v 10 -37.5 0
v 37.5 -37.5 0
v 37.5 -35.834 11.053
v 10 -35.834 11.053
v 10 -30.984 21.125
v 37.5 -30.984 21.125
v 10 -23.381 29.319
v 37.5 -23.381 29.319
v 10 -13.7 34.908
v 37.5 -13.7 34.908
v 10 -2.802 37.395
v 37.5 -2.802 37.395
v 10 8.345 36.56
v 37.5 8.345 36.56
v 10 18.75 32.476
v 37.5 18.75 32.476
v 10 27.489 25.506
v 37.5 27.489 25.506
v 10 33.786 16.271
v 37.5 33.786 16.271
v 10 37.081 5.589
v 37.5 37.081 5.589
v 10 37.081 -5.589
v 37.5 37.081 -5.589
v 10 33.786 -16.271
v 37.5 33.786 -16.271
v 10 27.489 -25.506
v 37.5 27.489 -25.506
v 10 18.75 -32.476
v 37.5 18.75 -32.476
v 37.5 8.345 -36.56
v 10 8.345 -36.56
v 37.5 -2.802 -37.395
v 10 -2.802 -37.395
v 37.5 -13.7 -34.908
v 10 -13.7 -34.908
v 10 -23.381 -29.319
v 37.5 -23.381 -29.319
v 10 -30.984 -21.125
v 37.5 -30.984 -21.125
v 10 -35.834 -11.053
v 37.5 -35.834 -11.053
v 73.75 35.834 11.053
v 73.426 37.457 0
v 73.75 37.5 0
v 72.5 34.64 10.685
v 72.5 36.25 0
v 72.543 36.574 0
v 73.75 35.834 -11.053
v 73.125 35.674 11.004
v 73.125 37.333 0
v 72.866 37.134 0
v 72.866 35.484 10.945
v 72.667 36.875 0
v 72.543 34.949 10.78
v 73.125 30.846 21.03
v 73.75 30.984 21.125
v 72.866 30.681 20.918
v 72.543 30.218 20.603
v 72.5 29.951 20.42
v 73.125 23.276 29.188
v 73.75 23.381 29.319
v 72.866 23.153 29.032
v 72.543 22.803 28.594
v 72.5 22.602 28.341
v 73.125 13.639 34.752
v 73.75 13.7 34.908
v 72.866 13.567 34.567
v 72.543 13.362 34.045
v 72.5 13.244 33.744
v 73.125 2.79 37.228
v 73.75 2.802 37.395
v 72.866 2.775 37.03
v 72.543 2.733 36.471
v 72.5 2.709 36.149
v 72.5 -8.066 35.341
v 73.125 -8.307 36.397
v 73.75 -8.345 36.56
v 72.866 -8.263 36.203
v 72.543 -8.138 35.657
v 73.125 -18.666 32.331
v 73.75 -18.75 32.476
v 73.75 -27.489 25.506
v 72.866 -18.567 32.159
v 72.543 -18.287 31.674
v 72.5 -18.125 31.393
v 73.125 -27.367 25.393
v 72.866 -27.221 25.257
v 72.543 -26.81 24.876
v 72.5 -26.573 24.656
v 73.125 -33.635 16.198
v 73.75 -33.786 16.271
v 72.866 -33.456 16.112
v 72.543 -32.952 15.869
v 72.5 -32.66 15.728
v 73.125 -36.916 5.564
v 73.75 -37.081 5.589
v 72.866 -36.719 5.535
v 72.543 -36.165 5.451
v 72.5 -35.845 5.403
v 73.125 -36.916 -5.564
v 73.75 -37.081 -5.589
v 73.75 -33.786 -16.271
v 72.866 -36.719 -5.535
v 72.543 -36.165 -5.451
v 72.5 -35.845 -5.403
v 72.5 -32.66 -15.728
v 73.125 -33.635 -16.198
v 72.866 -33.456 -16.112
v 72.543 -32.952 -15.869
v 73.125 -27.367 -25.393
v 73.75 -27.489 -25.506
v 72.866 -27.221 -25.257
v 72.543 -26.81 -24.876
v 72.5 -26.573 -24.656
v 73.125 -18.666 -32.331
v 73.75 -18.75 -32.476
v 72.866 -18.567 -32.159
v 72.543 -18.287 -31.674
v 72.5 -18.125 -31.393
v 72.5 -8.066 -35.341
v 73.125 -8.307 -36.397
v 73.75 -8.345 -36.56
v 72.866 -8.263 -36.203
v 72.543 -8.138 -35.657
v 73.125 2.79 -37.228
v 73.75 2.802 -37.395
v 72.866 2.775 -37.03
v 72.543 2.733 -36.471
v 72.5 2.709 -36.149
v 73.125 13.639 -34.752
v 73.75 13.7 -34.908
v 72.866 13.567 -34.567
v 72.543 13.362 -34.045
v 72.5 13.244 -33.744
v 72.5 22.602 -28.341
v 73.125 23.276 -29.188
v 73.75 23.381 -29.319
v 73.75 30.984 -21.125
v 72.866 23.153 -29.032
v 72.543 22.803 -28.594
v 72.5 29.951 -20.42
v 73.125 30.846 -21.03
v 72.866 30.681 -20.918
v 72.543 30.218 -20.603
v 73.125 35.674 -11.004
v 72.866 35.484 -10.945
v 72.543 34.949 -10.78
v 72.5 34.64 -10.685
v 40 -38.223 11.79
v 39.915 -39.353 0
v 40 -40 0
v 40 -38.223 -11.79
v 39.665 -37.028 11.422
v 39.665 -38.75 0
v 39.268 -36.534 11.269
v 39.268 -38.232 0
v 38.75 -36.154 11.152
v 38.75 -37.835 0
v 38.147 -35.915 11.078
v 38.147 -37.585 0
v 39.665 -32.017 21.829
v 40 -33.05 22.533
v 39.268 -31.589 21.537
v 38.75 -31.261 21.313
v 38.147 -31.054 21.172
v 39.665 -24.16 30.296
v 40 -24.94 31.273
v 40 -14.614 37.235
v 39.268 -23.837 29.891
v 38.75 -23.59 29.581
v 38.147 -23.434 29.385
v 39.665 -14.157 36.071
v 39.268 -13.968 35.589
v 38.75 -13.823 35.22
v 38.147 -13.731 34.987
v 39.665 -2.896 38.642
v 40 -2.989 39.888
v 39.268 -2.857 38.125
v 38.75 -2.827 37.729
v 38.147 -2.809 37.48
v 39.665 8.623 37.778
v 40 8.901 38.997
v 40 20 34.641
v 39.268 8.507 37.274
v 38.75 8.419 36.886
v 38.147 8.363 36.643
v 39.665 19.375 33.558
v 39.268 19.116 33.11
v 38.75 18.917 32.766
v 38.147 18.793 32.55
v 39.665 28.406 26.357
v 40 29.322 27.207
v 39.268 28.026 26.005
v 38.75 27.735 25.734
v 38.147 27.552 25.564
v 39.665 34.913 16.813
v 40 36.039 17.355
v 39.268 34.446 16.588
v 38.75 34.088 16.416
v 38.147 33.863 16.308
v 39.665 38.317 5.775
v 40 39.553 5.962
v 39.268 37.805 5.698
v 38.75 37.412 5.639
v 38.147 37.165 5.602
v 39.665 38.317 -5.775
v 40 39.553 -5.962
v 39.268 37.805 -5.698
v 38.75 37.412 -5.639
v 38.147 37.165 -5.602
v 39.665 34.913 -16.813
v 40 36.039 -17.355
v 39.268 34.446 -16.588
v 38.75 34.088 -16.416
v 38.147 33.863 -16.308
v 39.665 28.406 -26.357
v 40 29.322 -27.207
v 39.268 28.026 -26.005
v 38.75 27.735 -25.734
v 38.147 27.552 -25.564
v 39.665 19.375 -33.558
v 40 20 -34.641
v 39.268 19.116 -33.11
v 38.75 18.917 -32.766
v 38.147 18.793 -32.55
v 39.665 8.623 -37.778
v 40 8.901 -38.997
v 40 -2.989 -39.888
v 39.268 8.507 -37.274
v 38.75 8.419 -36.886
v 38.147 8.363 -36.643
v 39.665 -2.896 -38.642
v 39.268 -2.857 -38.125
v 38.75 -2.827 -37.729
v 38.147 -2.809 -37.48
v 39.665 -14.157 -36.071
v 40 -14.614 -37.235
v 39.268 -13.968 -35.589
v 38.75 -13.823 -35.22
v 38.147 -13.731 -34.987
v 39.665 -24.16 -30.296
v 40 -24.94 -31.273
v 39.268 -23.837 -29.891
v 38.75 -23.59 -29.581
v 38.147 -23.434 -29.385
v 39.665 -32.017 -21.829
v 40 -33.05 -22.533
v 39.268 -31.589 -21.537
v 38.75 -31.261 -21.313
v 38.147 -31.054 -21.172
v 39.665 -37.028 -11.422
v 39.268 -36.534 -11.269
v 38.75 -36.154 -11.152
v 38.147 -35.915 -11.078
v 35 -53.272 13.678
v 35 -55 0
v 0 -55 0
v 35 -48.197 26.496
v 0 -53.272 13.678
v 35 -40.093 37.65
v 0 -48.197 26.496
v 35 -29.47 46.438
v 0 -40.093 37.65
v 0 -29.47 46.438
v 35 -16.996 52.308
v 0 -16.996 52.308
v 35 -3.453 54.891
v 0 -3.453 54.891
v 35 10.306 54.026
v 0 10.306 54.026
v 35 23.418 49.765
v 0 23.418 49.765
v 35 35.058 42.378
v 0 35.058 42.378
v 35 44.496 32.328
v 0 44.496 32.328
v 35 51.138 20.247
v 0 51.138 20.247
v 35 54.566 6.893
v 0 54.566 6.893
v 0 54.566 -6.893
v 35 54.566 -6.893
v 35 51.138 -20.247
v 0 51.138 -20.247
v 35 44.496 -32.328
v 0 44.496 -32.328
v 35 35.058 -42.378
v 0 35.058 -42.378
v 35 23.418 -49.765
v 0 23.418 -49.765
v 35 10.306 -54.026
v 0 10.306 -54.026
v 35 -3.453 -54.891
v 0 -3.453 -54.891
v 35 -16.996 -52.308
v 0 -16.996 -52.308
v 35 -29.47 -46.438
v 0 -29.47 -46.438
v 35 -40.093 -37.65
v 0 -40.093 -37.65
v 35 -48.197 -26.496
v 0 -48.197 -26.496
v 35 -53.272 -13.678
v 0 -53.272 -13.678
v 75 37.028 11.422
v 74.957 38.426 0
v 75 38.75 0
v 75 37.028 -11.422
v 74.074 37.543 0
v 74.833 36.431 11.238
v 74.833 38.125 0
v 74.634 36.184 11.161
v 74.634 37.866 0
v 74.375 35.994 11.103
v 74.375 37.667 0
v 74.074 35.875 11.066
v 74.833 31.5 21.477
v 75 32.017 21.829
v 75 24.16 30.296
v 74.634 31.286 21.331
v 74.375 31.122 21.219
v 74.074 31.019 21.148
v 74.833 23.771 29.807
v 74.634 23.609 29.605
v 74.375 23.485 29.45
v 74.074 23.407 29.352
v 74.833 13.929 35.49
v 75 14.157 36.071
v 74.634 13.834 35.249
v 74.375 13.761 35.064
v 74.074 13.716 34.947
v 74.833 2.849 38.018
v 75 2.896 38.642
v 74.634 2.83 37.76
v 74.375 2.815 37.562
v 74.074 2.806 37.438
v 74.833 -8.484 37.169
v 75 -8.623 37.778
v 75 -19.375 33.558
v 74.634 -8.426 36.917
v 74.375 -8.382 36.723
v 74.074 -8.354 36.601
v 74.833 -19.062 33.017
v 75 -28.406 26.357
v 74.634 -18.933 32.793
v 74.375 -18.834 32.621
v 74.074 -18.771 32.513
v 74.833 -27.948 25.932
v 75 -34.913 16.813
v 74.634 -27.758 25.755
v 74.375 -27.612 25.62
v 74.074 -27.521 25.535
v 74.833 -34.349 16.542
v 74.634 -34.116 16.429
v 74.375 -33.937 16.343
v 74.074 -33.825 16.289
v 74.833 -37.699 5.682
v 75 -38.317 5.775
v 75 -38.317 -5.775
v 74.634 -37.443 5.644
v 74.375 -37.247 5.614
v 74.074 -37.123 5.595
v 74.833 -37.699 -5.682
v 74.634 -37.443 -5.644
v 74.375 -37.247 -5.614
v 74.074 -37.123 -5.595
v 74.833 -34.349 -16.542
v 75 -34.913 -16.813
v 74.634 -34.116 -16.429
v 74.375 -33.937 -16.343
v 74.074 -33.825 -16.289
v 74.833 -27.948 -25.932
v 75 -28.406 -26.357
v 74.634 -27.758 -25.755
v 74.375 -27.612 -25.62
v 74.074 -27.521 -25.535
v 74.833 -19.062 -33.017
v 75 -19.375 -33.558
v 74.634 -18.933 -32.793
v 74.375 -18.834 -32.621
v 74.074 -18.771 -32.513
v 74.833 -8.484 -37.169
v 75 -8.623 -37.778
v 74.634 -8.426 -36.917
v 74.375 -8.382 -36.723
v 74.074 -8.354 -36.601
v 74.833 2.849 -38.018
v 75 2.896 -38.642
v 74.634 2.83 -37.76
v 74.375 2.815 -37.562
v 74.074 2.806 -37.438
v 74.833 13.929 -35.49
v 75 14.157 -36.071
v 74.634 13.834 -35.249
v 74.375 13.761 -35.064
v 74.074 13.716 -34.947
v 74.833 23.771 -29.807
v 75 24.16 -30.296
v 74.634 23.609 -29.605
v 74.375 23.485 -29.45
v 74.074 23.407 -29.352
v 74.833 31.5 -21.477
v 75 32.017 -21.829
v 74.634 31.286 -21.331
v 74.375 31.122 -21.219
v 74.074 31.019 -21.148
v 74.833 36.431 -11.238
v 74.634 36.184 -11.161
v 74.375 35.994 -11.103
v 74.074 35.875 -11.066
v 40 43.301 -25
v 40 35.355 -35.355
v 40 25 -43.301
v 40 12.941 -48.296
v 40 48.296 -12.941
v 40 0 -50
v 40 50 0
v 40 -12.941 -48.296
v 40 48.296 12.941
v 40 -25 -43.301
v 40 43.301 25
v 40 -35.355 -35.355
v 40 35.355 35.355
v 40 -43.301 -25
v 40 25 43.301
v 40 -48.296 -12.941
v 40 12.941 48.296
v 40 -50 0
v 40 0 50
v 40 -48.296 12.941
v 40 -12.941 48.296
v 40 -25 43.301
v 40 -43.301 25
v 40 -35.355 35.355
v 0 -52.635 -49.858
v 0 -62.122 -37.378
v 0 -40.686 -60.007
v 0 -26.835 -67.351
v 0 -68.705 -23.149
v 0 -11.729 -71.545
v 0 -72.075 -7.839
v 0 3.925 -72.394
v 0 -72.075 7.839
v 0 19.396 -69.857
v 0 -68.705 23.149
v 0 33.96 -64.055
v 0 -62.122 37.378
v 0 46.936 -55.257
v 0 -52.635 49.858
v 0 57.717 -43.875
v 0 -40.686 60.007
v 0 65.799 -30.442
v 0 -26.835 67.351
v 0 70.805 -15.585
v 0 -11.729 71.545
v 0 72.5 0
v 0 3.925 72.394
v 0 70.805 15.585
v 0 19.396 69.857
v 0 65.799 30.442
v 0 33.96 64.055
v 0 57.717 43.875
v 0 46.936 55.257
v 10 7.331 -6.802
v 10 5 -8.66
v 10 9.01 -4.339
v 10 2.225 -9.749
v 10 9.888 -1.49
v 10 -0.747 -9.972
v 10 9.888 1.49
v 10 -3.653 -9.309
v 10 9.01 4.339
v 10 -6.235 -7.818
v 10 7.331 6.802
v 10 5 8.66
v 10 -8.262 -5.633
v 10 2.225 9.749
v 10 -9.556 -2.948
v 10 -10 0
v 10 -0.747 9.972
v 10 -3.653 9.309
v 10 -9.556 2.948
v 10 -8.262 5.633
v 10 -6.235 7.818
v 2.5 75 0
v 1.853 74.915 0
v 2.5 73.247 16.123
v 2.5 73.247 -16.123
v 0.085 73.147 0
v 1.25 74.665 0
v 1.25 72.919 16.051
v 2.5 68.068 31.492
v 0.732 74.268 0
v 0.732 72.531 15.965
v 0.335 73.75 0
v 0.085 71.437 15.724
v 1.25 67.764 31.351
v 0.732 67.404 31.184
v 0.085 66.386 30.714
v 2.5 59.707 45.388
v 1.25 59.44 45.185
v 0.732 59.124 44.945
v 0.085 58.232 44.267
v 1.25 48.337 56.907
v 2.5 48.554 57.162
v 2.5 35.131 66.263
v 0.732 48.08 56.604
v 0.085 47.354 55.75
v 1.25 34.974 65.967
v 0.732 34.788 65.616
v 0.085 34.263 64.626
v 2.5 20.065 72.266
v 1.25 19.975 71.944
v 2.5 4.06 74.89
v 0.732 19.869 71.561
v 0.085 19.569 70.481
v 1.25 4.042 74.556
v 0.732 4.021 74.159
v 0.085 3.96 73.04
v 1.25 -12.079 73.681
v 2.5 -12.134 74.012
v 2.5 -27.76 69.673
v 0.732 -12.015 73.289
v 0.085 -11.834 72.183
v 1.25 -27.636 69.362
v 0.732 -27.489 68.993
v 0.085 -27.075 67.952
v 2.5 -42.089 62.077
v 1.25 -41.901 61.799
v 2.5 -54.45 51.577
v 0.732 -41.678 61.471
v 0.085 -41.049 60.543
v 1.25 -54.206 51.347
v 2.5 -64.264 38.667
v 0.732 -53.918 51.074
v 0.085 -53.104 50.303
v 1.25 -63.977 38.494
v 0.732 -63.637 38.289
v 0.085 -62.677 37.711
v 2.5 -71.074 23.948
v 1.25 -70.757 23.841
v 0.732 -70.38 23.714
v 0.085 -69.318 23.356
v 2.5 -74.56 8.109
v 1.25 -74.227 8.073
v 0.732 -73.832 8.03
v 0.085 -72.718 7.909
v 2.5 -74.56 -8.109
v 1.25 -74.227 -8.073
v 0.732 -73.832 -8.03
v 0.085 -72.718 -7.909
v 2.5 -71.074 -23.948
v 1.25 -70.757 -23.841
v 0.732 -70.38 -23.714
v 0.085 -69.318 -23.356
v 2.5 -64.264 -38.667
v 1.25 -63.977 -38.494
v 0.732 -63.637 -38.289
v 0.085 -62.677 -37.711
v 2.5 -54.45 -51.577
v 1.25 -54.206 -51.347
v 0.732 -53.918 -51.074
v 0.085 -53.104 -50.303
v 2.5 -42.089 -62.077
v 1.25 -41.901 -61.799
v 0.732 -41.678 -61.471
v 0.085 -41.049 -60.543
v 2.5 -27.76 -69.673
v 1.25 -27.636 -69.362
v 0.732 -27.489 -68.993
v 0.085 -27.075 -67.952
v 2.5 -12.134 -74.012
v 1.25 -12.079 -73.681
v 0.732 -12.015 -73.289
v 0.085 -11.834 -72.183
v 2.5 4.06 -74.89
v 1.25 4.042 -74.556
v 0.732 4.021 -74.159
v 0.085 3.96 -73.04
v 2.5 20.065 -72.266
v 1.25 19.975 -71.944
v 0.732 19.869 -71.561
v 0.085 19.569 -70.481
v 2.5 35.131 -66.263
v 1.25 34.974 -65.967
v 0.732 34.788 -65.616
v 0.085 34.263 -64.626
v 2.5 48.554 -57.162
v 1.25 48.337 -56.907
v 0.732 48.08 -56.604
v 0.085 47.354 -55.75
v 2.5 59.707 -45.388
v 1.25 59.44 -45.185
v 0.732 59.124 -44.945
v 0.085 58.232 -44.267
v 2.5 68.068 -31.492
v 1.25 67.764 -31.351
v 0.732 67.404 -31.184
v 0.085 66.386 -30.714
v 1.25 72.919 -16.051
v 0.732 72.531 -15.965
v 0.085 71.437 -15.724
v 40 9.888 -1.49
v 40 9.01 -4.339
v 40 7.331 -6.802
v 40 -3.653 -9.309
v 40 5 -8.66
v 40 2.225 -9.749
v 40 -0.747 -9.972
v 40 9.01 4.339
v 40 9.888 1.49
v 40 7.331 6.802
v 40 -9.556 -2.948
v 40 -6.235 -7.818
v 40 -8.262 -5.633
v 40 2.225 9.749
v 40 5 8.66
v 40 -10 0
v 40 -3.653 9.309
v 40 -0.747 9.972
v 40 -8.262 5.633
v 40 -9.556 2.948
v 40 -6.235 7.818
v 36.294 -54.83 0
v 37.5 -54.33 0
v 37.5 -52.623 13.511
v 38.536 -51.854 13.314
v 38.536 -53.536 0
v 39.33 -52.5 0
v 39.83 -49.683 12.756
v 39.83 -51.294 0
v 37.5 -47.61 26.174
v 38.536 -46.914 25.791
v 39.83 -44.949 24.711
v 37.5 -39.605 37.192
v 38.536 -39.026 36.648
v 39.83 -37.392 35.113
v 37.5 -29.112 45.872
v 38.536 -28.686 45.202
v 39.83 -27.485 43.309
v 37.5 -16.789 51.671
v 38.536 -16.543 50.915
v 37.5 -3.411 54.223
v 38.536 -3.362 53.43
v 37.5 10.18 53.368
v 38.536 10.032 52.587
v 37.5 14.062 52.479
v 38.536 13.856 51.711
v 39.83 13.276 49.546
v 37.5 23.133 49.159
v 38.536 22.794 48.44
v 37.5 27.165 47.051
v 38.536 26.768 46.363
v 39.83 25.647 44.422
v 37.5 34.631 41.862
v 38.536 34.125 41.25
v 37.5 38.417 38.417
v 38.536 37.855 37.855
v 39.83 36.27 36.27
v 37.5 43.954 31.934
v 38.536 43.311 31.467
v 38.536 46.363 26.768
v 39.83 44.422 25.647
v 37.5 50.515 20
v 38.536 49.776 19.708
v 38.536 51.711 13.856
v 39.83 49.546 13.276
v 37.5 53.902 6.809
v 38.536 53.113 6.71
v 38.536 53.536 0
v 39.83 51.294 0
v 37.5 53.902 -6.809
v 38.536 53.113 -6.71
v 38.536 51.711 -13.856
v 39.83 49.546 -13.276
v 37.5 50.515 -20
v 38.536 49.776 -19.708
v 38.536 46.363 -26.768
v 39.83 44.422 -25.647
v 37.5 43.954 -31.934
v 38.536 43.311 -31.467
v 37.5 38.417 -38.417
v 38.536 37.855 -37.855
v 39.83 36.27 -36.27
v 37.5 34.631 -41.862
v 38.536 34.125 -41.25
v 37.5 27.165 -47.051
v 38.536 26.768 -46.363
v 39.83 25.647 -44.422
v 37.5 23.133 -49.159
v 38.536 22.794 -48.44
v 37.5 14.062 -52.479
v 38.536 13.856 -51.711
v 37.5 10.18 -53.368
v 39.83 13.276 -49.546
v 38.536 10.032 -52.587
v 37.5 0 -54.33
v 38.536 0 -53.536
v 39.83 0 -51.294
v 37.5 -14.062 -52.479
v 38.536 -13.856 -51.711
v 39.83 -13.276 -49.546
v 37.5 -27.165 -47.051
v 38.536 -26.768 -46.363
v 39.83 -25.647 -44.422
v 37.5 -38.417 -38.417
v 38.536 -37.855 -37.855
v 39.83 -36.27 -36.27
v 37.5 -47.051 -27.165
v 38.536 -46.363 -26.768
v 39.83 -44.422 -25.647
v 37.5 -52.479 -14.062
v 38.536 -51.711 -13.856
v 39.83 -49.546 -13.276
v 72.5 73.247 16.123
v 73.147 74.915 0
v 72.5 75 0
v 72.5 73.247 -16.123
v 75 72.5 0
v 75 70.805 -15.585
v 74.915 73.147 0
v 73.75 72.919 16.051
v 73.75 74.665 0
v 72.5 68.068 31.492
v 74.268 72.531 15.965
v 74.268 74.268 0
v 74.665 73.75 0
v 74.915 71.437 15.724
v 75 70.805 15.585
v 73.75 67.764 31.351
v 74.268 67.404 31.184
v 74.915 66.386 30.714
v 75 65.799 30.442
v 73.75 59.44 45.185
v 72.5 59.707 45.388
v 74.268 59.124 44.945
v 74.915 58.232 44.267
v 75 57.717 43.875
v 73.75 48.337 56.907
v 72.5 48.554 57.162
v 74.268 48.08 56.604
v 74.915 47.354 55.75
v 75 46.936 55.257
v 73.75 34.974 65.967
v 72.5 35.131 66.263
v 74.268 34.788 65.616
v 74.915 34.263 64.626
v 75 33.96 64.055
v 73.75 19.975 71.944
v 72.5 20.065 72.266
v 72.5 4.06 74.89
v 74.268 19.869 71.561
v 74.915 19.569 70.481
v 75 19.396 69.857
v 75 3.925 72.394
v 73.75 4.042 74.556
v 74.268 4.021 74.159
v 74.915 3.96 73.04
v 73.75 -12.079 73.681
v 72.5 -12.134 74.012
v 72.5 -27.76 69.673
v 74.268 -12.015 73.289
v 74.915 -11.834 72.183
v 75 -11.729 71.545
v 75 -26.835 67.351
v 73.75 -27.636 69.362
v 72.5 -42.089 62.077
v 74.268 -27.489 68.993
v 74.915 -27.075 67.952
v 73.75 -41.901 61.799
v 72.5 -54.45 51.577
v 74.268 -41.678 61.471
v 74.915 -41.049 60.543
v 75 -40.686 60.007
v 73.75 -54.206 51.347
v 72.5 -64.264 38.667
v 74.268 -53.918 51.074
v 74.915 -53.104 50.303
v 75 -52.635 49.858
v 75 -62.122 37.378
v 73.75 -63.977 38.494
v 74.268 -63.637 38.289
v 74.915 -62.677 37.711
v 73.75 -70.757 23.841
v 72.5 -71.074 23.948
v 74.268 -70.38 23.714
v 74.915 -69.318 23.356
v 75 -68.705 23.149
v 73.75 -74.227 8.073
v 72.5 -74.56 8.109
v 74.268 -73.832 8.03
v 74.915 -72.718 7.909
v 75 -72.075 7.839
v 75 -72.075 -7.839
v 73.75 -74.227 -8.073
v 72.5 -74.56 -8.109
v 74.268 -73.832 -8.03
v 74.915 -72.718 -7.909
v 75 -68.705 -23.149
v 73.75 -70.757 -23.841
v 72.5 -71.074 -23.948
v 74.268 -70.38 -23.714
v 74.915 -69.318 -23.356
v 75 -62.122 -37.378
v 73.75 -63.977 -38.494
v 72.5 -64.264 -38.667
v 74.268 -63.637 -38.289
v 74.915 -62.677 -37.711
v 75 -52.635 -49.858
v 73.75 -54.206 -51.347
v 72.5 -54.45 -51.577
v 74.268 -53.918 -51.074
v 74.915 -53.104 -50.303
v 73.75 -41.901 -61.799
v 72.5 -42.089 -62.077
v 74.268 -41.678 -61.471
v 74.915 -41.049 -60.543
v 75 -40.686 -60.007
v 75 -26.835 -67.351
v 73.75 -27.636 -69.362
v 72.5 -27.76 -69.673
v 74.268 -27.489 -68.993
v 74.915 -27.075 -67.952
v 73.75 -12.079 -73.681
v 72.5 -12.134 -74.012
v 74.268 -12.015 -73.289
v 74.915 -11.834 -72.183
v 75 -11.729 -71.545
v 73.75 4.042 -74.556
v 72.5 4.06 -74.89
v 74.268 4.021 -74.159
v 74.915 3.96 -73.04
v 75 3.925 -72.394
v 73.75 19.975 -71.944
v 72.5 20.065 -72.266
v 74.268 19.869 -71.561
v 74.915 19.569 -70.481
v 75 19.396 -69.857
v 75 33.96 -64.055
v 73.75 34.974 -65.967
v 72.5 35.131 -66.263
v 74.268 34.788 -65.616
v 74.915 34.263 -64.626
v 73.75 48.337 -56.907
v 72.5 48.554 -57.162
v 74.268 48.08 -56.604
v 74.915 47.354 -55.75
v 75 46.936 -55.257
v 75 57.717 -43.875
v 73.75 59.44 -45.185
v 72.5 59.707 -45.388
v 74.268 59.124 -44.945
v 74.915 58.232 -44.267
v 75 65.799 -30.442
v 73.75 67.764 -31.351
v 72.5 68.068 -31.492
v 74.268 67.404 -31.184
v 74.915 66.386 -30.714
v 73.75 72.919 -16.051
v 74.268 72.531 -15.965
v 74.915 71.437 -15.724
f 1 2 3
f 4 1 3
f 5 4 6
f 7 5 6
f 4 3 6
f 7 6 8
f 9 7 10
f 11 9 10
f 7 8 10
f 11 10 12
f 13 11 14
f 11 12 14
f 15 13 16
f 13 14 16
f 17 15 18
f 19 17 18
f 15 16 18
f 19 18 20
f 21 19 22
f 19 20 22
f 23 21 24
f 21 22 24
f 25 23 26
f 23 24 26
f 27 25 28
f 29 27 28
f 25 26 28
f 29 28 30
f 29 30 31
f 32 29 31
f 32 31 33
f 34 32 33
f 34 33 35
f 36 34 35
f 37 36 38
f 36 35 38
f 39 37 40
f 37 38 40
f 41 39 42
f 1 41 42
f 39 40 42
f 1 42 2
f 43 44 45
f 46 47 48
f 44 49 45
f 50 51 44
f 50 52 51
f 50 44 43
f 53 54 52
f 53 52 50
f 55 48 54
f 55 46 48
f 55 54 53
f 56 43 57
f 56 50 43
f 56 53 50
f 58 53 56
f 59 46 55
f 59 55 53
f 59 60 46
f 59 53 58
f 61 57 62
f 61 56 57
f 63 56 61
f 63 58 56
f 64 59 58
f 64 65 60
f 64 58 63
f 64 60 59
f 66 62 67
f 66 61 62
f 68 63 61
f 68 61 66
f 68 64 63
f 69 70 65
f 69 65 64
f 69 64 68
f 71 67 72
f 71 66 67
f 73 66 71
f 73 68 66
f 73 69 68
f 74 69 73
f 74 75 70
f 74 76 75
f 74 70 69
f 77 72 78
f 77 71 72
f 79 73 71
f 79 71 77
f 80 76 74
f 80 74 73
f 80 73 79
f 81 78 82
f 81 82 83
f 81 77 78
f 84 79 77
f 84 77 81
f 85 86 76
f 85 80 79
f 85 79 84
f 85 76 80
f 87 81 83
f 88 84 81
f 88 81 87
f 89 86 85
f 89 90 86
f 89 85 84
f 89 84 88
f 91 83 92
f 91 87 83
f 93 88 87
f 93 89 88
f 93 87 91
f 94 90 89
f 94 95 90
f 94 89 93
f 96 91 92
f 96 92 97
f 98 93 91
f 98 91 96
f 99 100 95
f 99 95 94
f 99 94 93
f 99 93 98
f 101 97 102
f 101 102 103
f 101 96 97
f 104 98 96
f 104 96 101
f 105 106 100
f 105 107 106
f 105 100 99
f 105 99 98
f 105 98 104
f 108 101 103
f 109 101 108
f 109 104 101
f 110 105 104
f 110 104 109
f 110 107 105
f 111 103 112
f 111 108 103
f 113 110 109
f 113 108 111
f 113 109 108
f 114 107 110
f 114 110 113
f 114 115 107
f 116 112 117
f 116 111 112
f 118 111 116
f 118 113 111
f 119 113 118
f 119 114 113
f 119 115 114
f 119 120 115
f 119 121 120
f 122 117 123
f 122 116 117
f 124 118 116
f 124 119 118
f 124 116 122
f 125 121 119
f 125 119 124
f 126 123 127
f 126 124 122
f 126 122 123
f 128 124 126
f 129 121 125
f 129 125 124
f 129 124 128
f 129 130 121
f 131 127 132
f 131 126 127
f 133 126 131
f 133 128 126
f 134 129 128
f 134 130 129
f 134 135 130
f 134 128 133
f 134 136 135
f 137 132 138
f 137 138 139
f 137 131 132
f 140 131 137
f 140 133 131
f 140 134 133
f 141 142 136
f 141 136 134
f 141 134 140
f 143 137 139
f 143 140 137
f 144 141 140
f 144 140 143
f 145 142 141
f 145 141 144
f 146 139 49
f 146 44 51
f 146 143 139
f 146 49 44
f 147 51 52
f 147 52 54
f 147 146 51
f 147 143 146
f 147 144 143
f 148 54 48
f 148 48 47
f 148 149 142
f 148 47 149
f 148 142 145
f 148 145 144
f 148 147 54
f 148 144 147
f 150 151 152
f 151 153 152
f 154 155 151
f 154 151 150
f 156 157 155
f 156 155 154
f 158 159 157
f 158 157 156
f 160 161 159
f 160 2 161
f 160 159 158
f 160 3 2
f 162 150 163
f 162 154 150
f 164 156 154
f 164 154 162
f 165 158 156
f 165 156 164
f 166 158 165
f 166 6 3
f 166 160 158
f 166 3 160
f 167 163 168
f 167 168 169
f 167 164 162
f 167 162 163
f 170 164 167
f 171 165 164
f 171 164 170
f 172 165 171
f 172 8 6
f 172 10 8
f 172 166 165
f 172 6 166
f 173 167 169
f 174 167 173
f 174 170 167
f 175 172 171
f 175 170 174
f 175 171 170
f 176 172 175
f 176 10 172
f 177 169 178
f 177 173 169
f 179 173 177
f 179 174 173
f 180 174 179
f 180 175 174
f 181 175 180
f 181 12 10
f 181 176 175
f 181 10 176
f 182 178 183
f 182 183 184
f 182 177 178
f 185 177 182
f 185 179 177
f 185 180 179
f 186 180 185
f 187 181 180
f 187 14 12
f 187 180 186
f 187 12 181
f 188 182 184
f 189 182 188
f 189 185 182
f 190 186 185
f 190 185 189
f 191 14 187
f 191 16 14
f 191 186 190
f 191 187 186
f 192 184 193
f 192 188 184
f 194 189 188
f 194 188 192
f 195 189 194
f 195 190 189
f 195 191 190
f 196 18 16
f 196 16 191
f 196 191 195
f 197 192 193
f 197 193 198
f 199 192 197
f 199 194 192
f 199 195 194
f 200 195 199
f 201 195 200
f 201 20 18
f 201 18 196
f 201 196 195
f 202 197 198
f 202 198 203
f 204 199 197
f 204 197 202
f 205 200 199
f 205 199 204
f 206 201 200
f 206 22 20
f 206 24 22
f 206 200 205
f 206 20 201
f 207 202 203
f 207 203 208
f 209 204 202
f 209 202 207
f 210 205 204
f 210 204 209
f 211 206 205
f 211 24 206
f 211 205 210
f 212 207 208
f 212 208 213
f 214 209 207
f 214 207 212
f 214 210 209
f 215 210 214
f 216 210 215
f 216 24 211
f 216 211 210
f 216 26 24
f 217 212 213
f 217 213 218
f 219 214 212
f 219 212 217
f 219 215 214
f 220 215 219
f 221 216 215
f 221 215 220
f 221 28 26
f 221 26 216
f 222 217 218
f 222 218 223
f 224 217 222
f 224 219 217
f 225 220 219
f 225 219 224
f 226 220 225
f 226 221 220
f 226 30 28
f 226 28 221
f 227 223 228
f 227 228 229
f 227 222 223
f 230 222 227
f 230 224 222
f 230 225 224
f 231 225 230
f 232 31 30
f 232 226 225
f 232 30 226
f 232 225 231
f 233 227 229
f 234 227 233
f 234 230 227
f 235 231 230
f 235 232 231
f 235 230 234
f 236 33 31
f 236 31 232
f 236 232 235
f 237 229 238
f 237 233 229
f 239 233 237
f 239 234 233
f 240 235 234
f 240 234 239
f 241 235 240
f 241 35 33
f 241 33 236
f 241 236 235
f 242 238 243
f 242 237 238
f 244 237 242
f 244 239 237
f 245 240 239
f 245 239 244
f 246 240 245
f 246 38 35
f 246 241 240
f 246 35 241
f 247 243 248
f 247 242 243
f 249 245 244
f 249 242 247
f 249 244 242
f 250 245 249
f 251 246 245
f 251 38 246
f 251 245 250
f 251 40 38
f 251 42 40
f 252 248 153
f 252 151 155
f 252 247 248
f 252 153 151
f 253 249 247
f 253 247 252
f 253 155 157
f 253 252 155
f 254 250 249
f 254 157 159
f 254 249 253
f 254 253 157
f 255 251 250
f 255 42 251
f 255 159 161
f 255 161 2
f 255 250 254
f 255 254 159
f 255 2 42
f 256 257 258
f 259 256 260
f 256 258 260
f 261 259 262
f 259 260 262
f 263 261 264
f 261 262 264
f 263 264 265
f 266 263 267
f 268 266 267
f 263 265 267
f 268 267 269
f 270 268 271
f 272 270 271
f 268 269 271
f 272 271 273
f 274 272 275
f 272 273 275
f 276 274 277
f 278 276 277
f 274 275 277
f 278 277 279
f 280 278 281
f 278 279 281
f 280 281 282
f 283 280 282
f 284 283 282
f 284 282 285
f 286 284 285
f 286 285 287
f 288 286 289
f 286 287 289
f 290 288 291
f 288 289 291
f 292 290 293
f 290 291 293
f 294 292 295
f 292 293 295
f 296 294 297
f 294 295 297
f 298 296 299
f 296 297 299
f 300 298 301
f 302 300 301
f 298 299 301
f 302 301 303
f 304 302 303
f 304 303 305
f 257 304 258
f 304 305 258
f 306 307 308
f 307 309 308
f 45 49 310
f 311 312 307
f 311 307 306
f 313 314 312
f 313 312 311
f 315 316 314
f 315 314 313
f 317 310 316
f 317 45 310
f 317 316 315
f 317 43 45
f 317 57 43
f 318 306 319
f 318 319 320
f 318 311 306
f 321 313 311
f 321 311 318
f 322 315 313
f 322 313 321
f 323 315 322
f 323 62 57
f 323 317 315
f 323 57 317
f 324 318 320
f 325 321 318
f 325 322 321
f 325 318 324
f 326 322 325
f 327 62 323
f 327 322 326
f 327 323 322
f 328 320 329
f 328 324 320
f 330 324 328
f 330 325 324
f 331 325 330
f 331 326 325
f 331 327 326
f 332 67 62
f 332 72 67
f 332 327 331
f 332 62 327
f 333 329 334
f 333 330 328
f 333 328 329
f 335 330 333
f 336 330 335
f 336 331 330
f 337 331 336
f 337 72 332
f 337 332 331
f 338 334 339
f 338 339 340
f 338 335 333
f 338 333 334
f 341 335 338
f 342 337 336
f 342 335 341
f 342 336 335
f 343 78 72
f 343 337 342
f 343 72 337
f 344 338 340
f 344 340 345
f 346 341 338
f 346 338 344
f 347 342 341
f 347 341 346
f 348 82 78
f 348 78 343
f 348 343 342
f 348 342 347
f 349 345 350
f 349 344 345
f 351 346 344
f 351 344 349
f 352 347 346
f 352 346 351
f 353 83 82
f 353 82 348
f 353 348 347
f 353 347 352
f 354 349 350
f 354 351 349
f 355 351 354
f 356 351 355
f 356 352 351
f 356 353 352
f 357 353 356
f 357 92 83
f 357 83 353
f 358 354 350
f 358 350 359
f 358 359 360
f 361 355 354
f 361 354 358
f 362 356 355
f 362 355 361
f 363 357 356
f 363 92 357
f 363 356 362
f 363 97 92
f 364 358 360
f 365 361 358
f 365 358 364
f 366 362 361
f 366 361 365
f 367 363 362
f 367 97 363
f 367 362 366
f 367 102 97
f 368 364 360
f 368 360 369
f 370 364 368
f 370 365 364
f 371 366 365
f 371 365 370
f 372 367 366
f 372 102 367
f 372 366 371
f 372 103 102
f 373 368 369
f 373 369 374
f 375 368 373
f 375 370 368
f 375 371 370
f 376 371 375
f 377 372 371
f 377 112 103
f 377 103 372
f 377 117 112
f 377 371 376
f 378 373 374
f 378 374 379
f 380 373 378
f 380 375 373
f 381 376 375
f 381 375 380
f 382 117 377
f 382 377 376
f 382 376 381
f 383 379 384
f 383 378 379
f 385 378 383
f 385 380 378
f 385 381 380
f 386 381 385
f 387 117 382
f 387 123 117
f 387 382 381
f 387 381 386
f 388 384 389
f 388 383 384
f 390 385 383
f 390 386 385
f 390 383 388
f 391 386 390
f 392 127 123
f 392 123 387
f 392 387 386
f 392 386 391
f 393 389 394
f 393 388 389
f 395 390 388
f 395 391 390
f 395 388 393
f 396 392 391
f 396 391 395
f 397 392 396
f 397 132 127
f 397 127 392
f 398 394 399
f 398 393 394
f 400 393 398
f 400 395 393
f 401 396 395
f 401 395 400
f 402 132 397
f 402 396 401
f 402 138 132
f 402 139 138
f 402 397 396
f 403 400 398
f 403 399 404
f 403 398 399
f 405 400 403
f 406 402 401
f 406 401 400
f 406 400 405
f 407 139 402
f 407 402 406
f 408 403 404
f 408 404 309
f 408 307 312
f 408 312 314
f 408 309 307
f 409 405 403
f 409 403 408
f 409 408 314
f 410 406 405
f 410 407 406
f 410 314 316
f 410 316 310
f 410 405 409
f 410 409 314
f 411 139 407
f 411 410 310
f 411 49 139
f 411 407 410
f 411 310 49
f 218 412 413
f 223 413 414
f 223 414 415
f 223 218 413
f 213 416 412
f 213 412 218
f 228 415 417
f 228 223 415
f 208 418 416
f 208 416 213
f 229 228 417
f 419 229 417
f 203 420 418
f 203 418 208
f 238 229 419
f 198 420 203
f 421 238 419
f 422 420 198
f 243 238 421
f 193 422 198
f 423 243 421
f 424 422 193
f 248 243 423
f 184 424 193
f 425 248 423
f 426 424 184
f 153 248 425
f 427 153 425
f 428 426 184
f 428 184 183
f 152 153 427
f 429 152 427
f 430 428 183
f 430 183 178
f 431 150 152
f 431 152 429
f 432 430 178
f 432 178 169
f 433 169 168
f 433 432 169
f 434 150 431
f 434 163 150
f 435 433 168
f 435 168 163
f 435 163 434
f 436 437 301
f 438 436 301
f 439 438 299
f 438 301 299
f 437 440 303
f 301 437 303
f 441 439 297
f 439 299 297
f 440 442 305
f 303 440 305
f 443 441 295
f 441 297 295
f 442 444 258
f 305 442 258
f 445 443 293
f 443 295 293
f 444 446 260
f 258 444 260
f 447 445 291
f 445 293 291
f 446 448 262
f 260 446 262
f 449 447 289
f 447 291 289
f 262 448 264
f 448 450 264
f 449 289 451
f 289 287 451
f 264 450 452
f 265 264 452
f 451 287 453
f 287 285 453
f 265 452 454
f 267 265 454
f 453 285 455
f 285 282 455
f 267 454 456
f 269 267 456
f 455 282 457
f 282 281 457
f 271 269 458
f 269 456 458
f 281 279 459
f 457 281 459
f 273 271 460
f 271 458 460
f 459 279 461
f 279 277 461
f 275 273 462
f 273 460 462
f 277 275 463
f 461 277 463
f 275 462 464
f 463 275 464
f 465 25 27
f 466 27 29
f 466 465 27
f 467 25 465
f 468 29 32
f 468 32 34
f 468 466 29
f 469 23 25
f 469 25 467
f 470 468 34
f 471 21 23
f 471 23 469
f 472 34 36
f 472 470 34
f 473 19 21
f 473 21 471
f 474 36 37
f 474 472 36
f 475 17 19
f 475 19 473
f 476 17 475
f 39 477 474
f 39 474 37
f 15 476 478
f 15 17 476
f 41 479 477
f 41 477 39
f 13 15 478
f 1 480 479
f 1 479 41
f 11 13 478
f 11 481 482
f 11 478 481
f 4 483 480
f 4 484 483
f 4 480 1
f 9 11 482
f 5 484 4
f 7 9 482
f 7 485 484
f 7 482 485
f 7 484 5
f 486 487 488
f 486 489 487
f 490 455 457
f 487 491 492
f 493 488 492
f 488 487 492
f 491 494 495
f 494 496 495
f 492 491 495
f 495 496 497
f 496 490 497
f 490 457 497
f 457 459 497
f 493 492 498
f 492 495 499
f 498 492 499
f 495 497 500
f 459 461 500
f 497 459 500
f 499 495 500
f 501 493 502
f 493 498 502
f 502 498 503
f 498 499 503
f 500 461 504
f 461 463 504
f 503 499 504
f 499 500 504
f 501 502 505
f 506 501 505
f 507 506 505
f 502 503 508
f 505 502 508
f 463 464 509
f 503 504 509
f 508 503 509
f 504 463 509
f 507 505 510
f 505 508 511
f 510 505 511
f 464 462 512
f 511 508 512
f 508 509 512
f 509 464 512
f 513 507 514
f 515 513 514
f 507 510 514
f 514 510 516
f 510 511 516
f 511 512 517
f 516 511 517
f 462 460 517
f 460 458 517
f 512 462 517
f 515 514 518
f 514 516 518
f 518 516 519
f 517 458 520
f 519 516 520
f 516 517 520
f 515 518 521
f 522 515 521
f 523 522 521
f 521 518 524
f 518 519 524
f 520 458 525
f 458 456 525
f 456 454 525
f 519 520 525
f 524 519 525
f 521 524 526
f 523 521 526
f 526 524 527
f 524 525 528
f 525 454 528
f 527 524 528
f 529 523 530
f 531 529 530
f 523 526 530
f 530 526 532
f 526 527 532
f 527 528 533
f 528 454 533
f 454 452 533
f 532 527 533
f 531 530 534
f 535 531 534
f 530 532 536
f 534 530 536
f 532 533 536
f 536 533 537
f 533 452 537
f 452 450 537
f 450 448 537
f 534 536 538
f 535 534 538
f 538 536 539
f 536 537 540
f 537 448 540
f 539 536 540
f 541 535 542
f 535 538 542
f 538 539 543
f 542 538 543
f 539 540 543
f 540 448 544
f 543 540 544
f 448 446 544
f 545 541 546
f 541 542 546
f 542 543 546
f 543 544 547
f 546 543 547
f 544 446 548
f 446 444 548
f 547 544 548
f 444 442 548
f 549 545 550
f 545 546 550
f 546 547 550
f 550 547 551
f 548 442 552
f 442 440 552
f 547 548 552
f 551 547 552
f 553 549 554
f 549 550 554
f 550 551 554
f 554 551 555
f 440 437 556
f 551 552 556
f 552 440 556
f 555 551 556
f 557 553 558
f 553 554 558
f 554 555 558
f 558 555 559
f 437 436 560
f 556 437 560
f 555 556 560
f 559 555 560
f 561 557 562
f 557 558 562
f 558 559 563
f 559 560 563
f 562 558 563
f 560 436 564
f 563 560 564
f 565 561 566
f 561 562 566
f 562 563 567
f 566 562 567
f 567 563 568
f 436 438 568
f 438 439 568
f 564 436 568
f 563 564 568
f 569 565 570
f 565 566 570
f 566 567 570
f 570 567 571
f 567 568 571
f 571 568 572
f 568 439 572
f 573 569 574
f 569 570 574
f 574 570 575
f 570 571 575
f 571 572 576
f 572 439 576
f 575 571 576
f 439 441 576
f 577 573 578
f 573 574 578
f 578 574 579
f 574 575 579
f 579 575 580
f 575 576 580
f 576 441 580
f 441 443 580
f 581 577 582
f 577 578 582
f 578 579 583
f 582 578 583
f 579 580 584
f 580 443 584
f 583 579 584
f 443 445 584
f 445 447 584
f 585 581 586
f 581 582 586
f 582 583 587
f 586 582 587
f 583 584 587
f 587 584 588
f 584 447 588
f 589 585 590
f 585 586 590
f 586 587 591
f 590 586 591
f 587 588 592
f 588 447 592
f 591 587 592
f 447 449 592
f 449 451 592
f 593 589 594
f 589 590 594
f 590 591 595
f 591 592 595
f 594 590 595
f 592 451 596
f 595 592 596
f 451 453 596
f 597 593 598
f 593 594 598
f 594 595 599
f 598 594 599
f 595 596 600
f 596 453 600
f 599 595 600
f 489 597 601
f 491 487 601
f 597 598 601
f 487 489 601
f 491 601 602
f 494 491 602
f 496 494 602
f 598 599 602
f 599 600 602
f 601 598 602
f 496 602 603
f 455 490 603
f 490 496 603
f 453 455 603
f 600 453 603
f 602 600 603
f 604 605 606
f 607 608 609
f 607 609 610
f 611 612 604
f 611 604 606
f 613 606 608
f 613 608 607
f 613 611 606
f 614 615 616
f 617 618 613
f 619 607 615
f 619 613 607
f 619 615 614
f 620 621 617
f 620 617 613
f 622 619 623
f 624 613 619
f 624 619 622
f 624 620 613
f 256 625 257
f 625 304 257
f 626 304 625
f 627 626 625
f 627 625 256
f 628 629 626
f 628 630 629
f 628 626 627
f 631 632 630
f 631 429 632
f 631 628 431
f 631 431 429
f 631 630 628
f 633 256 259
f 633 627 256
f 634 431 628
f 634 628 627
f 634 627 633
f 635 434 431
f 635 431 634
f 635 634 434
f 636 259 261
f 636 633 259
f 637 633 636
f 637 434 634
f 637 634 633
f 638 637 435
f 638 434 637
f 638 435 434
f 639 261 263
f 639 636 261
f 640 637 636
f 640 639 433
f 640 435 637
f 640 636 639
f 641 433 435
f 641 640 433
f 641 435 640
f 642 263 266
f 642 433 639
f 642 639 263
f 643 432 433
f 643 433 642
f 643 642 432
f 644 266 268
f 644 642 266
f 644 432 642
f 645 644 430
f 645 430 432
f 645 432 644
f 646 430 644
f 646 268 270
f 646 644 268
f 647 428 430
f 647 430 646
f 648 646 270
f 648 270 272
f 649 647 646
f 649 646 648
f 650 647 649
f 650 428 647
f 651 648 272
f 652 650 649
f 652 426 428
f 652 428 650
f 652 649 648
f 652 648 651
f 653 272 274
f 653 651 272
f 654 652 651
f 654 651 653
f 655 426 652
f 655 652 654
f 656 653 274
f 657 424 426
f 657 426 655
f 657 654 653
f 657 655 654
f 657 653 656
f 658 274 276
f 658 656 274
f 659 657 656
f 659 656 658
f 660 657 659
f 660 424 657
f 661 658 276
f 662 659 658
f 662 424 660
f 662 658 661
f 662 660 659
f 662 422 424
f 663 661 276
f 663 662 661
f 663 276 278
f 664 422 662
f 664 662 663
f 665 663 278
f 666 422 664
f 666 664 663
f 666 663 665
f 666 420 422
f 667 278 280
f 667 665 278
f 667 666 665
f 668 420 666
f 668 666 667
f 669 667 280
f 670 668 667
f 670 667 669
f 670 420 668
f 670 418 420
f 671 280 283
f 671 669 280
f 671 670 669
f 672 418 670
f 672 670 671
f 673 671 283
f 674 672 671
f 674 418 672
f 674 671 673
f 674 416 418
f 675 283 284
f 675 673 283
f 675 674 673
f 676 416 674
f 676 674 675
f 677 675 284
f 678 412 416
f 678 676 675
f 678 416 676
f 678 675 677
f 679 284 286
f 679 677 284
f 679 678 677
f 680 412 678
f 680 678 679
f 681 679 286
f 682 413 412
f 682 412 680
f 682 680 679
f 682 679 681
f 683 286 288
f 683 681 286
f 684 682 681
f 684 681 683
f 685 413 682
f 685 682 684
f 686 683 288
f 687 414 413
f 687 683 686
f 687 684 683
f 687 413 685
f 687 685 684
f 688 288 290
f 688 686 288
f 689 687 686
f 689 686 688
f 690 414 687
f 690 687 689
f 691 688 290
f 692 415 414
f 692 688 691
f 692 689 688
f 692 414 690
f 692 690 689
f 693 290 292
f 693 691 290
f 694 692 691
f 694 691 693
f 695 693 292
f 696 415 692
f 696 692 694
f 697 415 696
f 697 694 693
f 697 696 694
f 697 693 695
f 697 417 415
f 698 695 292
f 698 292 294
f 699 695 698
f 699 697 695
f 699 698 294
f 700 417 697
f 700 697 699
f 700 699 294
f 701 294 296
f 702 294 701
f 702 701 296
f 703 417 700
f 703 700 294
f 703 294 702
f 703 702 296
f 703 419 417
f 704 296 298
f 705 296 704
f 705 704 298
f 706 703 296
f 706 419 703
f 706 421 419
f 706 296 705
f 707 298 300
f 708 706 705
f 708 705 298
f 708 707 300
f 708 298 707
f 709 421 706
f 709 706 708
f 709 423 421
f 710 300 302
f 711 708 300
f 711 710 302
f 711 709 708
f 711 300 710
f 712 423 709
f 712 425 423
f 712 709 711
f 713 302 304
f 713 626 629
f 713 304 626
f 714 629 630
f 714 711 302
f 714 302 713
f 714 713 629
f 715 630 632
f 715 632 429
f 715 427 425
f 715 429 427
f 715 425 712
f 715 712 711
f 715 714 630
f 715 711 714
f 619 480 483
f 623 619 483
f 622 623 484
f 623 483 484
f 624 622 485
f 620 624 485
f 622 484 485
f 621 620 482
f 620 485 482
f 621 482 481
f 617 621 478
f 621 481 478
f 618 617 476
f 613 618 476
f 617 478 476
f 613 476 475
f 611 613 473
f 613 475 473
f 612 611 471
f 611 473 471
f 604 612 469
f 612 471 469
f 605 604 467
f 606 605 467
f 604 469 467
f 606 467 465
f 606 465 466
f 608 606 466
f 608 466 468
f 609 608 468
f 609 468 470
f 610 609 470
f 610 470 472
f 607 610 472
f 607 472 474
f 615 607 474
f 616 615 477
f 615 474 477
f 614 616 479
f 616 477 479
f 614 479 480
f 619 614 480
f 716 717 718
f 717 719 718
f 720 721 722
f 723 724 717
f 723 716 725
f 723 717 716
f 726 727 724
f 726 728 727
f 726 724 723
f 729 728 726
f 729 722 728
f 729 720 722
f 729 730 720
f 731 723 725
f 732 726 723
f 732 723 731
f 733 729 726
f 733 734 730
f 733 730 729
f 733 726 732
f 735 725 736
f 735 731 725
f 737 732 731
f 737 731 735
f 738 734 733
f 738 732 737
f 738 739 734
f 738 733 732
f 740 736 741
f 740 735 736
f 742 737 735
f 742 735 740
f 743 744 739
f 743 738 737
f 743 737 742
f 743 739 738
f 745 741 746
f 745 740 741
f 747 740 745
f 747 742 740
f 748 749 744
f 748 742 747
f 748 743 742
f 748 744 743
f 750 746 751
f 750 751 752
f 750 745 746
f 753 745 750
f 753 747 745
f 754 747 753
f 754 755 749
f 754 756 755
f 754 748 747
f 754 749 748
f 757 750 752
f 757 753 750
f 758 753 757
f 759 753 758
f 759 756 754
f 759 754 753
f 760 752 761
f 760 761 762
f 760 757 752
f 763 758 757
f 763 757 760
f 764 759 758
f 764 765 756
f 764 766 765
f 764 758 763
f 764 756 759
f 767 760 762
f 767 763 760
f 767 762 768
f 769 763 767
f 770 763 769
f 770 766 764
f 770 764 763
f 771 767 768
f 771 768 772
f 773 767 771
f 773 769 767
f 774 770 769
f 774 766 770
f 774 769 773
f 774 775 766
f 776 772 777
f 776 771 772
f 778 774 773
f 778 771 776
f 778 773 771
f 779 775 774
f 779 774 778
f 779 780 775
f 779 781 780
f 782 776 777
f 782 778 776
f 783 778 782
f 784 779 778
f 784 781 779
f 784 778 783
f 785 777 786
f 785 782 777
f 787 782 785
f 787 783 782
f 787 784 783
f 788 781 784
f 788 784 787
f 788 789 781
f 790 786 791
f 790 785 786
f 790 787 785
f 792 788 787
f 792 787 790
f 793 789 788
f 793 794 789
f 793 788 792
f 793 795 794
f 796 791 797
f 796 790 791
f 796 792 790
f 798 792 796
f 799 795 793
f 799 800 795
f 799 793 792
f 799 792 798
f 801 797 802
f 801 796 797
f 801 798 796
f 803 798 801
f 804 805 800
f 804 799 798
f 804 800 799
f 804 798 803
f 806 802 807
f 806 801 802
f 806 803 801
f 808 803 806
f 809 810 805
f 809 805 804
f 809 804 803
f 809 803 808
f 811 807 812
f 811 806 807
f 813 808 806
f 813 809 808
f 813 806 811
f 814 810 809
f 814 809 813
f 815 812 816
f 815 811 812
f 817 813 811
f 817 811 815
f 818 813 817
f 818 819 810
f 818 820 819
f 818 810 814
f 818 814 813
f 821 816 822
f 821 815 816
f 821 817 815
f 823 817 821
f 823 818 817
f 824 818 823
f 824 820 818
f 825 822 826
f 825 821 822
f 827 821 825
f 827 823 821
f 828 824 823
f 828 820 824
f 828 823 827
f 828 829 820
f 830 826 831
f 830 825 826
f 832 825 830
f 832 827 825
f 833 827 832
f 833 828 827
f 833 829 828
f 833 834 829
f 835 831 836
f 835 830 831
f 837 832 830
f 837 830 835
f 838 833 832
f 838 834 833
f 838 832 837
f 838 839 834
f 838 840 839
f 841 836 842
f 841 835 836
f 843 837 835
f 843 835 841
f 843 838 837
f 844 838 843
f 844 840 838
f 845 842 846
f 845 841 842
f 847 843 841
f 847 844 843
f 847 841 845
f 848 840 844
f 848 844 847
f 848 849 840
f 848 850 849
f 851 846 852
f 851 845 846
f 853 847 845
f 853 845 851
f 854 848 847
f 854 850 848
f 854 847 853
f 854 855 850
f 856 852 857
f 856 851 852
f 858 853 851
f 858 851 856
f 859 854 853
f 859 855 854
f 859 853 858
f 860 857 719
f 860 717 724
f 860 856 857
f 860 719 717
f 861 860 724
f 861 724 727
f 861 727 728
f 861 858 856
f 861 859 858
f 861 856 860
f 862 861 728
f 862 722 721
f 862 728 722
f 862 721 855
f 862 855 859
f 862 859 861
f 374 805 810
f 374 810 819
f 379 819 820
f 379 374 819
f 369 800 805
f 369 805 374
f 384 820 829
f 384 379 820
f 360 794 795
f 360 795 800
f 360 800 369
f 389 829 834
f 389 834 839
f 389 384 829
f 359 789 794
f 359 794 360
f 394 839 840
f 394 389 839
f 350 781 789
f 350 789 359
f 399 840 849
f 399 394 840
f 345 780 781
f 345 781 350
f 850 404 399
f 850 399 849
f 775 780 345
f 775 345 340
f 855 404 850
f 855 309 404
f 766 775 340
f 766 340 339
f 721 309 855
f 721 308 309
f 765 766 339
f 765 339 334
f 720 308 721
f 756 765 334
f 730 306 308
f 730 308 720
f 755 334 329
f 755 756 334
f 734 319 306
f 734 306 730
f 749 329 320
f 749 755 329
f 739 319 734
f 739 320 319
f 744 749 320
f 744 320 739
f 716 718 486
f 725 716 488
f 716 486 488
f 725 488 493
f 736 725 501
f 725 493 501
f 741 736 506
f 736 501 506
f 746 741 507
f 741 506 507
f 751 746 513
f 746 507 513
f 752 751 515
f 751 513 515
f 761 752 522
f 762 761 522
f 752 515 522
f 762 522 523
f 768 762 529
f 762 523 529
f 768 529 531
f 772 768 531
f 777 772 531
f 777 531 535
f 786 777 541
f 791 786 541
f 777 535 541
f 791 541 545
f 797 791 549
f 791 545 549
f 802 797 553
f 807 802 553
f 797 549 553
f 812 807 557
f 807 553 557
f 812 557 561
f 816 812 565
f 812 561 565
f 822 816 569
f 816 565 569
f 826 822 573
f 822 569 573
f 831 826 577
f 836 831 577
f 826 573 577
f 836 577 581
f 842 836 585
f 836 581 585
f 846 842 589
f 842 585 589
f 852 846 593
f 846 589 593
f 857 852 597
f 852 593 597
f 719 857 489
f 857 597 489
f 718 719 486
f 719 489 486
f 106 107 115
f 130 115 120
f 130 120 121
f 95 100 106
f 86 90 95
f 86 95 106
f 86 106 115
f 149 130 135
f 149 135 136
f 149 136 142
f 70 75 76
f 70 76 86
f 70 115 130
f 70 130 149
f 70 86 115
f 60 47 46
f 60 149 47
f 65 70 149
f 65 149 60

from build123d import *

# Parameters (mm, degrees)
F0_R      = 75
F1_DEPTH  = 75
F2_R      = 55
F3_DEPTH  = 40
F4_R      = 37.5
F5_DEPTH  = 30
F6_R      = 10
F7_DEPTH  = 30
F8_R      = 2.5
F9_R      = 37.5
F10_DEPTH = 2.5
F11_R     = 1.24999
F12_R     = 5


# Not quite as in the source:
# - a fillet or chamfer is up to 0.001 mm smaller than in the source, because OpenCascade refuses the exact size


with BuildPart() as f1:
    # F0 (on Right) → F1 (new body)
    with BuildSketch(Plane.YZ):
        Circle(F0_R)
    extrude(amount=F1_DEPTH)

    # F2 (on face) → F3 (cut)
    with BuildSketch(Plane(origin=(0, 0, 0), x_dir=(0, -1, 0), z_dir=(-1, 0, 0))):
        Circle(F2_R)
    extrude(amount=-F3_DEPTH, mode=Mode.SUBTRACT)

    # F4 (on face) → F5 (join)
    with BuildSketch(Plane(origin=(40, 0, 0), x_dir=(0, -1, 0), z_dir=(-1, 0, 0))):
        Circle(F4_R)
    extrude(amount=F5_DEPTH)

    # F6 (on face) → F7 (cut)
    with BuildSketch(Plane(origin=(10, 0, 0), x_dir=(0, -1, 0), z_dir=(-1, 0, 0))):
        Circle(F6_R)
    extrude(amount=-F7_DEPTH, mode=Mode.SUBTRACT)

    # F8
    f8_edges = [f1.edges().sort_by_distance(p)[0] for p in [
        (40, 37.5, 0),
        (37.5, 75, 0),
        (0, -75, 0),
        (75, -75, 0),
    ]]
    fillet(f8_edges, radius=F8_R)

    # F9 (on face) → F10 (cut)
    with BuildSketch(Plane.YZ.offset(75)):
        Circle(F9_R)
    extrude(amount=-F10_DEPTH, mode=Mode.SUBTRACT)

    # F11 (radius 1.25 in the source; OpenCascade refuses exactly that, so slightly less here)
    f11_edges = [f1.edges().sort_by_distance(p)[0] for p in [
        (72.5, -37.5, 0),
        (75, -37.5, 0),
    ]]
    fillet(f11_edges, radius=F11_R)

    # F12
    f12_edges = [f1.edges().sort_by_distance(p)[0] for p in [
        (40, 55, 0),
    ]]
    fillet(f12_edges, radius=F12_R)


solid = f1.part
